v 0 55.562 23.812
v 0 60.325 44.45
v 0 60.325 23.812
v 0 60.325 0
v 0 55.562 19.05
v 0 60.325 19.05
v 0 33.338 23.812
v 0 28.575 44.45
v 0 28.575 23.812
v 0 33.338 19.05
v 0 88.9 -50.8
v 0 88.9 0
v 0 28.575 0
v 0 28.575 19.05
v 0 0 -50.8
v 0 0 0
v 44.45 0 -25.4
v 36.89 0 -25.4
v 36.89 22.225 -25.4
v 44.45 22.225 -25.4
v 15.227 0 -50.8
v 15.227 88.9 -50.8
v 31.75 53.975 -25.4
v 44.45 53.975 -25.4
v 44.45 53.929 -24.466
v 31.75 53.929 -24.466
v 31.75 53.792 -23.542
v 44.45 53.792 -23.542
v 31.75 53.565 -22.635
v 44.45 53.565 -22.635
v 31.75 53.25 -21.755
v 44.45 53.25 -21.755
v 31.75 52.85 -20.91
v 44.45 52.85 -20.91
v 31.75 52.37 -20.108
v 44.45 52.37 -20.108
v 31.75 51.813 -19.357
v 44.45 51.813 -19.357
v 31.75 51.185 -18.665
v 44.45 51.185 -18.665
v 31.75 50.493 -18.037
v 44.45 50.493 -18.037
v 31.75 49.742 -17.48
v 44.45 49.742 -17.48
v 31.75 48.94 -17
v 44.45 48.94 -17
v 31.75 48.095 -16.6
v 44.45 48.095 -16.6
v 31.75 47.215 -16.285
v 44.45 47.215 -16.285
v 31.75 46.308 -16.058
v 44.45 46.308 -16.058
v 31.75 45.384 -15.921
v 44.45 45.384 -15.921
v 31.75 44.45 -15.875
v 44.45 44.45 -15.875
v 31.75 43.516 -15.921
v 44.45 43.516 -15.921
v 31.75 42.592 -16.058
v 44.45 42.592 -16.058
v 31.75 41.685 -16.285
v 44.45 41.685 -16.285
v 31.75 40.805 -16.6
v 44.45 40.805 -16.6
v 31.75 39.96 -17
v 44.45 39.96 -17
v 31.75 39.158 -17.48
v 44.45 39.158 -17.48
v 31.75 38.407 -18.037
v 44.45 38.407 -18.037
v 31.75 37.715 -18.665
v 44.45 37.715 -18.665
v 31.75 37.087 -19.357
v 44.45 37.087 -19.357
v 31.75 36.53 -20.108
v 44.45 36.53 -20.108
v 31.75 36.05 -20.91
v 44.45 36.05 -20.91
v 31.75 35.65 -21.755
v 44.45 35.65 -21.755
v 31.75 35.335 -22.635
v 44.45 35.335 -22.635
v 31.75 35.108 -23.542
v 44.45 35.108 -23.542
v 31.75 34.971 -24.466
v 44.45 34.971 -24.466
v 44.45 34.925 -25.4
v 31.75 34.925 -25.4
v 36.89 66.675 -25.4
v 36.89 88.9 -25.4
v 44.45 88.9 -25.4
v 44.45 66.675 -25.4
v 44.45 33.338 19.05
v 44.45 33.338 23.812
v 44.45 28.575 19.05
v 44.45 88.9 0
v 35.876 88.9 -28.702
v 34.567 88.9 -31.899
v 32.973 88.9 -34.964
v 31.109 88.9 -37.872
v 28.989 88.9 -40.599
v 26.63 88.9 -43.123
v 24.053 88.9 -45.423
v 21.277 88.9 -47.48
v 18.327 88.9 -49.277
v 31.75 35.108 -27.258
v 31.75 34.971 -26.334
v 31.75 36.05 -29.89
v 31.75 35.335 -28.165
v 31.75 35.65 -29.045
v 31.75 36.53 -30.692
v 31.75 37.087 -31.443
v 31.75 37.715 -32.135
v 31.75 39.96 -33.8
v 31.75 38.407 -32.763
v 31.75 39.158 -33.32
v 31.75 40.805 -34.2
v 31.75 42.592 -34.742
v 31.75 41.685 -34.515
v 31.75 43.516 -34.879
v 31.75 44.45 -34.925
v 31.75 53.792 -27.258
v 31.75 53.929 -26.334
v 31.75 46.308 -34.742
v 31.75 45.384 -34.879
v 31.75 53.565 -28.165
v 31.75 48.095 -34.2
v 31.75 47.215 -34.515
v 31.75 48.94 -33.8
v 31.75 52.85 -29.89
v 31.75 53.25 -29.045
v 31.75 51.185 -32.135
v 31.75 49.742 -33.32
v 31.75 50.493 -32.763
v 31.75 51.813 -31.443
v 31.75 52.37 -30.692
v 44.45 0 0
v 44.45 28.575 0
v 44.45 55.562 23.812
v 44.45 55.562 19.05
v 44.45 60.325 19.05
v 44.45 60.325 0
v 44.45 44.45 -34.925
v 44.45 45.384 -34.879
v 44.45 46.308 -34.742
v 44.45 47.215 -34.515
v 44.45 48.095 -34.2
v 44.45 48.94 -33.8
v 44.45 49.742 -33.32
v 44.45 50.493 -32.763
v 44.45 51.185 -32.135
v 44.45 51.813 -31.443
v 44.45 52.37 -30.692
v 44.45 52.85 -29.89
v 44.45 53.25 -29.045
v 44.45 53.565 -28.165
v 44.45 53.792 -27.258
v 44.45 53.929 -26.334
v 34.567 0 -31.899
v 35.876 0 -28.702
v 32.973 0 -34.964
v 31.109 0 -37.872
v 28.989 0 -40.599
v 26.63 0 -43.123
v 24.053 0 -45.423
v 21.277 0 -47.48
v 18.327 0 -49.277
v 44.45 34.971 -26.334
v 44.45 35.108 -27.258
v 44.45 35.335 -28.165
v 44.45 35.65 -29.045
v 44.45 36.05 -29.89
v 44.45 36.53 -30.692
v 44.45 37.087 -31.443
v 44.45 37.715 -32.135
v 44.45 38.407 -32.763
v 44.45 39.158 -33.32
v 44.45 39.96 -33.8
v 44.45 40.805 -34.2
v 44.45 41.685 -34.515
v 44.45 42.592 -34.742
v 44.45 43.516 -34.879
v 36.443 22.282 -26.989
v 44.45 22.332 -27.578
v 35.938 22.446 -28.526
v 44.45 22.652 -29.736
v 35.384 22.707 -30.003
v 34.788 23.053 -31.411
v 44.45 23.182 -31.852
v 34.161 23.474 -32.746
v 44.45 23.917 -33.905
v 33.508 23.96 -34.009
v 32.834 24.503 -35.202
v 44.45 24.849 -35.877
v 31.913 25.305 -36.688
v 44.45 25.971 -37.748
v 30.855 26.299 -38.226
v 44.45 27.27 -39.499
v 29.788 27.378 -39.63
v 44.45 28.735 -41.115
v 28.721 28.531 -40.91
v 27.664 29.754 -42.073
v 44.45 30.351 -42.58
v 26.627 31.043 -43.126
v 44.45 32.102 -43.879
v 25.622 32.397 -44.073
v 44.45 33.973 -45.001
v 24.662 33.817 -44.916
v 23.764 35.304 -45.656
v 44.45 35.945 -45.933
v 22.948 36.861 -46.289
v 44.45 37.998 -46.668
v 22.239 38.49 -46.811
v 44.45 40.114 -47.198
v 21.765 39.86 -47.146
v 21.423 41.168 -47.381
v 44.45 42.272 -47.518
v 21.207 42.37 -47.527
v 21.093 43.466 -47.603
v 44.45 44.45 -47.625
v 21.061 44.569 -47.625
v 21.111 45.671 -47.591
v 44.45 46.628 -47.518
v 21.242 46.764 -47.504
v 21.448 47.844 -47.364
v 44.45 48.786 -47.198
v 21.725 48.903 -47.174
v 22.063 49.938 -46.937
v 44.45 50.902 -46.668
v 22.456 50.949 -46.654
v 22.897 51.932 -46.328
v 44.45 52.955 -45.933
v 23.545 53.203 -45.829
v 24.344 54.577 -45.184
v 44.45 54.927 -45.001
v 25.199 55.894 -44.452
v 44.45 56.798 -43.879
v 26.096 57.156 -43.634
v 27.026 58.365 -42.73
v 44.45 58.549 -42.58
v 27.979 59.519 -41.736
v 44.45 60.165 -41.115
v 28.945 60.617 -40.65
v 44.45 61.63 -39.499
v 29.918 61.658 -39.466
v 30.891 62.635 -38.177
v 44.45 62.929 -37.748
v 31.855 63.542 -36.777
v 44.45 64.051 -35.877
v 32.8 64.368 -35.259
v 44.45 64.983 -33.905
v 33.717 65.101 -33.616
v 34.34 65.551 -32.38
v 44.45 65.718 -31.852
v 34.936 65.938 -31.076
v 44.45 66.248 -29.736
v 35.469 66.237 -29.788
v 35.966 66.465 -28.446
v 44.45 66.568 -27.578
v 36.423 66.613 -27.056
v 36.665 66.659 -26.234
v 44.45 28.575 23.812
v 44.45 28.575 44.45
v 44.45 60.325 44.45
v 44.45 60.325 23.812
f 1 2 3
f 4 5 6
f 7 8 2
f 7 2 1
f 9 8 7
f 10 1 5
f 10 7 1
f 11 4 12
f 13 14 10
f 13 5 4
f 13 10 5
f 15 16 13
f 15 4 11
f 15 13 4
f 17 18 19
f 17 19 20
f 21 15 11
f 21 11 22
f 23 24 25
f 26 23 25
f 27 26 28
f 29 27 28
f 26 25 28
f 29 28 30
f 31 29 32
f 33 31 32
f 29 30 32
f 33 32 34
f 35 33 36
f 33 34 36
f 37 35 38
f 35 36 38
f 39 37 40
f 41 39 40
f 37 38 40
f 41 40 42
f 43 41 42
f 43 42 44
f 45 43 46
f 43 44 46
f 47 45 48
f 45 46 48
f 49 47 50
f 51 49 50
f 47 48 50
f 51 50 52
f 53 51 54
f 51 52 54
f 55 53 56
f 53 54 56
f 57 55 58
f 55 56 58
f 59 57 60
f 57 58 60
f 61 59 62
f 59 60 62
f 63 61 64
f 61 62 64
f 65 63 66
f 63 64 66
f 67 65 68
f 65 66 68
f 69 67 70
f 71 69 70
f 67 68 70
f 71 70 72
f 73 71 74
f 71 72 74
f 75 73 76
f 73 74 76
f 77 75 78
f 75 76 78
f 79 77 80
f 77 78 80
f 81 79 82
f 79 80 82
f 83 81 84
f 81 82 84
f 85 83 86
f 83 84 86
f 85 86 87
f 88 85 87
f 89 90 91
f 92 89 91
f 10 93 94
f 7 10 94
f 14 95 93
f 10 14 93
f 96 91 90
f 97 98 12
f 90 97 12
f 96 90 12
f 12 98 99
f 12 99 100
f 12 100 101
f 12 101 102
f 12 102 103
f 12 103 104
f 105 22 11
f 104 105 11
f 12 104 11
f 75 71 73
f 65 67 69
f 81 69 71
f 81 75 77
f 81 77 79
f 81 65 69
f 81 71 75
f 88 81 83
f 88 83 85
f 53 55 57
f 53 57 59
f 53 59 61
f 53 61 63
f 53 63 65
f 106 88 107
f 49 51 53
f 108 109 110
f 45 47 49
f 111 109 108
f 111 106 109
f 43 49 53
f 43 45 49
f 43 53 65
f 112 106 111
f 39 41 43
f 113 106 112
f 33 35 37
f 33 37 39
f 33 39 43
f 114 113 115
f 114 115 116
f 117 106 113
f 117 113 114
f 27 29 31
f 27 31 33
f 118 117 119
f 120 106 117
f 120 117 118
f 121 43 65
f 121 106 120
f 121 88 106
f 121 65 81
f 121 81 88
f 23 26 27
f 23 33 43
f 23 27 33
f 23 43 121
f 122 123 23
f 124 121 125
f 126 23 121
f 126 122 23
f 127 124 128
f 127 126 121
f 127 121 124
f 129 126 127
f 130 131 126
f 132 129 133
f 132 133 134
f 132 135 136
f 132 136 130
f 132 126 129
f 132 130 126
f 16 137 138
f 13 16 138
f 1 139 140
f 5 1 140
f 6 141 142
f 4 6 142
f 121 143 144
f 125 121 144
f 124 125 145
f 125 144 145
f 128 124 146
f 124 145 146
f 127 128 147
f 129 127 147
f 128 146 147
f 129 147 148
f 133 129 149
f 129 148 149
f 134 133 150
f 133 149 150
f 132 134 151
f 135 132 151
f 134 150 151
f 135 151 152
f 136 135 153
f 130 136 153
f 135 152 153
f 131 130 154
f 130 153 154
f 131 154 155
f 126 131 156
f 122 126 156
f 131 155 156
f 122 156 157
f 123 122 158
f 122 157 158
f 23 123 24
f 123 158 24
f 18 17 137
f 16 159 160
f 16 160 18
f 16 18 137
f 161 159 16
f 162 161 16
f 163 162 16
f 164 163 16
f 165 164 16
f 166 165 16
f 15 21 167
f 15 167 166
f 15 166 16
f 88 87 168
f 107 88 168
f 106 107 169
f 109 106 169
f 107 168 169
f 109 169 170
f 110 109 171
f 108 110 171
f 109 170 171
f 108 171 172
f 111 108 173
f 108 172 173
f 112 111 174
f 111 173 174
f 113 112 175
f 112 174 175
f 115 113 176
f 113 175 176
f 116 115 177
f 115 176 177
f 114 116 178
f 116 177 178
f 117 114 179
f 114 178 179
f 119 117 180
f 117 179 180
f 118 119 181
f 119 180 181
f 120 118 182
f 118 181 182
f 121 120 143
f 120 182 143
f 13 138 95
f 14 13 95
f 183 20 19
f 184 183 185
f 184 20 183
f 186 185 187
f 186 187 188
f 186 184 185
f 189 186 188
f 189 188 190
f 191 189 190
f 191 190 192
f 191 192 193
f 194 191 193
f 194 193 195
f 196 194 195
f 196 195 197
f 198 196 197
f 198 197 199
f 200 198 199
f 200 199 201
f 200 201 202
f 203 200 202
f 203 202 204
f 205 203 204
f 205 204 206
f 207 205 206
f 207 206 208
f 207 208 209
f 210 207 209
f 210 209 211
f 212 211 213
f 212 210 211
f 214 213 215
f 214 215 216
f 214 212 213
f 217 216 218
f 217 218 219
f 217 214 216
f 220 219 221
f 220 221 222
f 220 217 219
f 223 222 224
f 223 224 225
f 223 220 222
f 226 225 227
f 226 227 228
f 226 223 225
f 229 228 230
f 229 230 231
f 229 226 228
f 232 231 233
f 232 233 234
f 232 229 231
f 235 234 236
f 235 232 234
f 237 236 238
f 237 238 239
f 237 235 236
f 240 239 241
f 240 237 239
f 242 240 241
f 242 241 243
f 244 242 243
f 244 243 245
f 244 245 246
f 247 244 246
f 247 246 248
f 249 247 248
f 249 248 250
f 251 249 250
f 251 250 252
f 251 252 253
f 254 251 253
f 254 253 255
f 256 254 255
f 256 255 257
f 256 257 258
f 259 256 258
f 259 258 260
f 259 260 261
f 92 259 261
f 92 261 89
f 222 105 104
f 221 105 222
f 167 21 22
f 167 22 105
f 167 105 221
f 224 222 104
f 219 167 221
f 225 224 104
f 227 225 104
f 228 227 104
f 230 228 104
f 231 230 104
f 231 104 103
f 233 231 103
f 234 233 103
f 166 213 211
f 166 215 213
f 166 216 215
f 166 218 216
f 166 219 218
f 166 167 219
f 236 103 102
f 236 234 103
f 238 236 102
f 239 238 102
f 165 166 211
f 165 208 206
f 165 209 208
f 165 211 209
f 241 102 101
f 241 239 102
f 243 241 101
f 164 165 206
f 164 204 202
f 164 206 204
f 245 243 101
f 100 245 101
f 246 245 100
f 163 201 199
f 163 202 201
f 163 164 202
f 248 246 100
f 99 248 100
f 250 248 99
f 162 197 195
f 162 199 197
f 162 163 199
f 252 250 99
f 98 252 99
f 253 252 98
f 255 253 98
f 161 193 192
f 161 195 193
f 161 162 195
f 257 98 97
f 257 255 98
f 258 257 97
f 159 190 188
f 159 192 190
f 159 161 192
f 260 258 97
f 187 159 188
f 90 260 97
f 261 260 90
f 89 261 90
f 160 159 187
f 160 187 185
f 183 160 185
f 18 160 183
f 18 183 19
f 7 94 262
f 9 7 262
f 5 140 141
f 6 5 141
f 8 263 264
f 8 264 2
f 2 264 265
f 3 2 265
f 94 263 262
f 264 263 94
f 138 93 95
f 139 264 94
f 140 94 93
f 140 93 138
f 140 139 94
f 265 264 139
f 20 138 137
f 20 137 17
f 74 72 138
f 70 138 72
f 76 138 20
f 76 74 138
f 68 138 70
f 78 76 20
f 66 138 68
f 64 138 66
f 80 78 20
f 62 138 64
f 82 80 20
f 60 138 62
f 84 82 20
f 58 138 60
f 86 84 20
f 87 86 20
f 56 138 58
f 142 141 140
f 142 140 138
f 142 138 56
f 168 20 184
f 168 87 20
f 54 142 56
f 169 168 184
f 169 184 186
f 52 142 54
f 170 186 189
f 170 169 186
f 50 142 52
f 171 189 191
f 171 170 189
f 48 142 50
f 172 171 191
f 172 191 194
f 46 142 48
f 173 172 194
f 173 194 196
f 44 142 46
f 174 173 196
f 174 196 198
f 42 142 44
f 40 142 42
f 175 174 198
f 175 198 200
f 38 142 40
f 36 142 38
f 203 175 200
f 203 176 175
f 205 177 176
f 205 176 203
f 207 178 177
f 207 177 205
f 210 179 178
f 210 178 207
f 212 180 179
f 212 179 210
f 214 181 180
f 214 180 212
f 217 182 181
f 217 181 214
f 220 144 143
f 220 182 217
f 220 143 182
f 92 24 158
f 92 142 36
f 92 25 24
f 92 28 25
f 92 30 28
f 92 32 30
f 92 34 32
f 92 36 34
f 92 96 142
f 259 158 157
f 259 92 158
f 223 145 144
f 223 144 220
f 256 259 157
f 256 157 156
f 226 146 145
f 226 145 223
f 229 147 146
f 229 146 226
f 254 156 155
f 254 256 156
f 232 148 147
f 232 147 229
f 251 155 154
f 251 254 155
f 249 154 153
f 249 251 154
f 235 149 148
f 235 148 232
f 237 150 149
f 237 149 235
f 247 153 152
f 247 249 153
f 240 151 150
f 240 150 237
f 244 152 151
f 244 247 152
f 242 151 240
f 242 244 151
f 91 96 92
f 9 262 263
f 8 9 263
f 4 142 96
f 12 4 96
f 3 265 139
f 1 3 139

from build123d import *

# Parameters (mm, degrees)
BOSS_EXTRUDE1_DEPTH = 88.9
BOSS_EXTRUDE2_DEPTH = 44.45
CUT_EXTRUDE1_DEPTH  = 12.7
CUT_EXTRUDE2_DEPTH  = 44.45


with BuildPart() as part:
    # Sketch2 → Boss-Extrude1 (new body)
    with BuildSketch(Plane(origin=(0, 0, 0), x_dir=(1, 0, 0), z_dir=(0, 1, 0))):
        with BuildLine():
            Line((0, 0), (0, 50.8))
            Line((0, 50.8), (15.226765087, 50.8))
            ThreePointArc((15.226765087, 50.8), (28.988508692, 40.599003798), (36.890166373, 25.4))
            Line((36.890166373, 25.4), (44.45, 25.4))
            Line((44.45, 25.4), (44.45, -44.45))
            Line((44.45, -44.45), (0, -44.45))
            Line((0, -44.45), (0, 0))
        make_face()
    extrude(amount=BOSS_EXTRUDE1_DEPTH)

    # Sketch3 → Boss-Extrude2 (add)
    with BuildSketch(Plane(origin=(44.45, 0, 0), x_dir=(0, 0, -1), z_dir=(1, 0, 0))):
        with BuildLine():
            Line((25.4, 66.675), (25.4, 22.225))
            ThreePointArc((25.4, 22.225), (47.625, 44.45), (25.4, 66.675))
        make_face()
    extrude(amount=-BOSS_EXTRUDE2_DEPTH)

    # Sketch4 → Cut-Extrude1 (cut)
    with BuildSketch(Plane(origin=(44.45, 0, 0), x_dir=(0, 0, -1), z_dir=(1, 0, 0))):
        with BuildLine():
            ThreePointArc((34.925, 44.45), (32.135192091, 51.185192091), (25.4, 53.975))
            Line((25.4, 53.975), (25.4, 34.925))
            ThreePointArc((25.4, 34.925), (32.135192091, 37.714807909), (34.925, 44.45))
        make_face()
        with BuildLine():
            Line((25.4, 34.925), (25.4, 53.975))
            ThreePointArc((25.4, 53.975), (15.875, 44.45), (25.4, 34.925))
        make_face()
    extrude(amount=-CUT_EXTRUDE1_DEPTH, mode=Mode.SUBTRACT)

    # Sketch5 → Cut-Extrude2 (cut)
    with BuildSketch(Plane(origin=(44.45, 0, 0), x_dir=(0, 0, -1), z_dir=(1, 0, 0))):
        Polygon((0, 88.9), (-44.45, 88.9), (-44.45, 60.325), (-23.8125, 60.325), (-23.8125, 55.5625), (-19.05, 55.5625), (-19.05, 60.325), (0, 60.325), align=None)
        Polygon((-23.8125, 28.575), (-44.45, 28.575), (-44.45, 0), (0, 0), (0, 28.575), (-19.05, 28.575), (-19.05, 33.3375), (-23.8125, 33.3375), align=None)
    extrude(amount=-CUT_EXTRUDE2_DEPTH, mode=Mode.SUBTRACT)


solid = part.part
